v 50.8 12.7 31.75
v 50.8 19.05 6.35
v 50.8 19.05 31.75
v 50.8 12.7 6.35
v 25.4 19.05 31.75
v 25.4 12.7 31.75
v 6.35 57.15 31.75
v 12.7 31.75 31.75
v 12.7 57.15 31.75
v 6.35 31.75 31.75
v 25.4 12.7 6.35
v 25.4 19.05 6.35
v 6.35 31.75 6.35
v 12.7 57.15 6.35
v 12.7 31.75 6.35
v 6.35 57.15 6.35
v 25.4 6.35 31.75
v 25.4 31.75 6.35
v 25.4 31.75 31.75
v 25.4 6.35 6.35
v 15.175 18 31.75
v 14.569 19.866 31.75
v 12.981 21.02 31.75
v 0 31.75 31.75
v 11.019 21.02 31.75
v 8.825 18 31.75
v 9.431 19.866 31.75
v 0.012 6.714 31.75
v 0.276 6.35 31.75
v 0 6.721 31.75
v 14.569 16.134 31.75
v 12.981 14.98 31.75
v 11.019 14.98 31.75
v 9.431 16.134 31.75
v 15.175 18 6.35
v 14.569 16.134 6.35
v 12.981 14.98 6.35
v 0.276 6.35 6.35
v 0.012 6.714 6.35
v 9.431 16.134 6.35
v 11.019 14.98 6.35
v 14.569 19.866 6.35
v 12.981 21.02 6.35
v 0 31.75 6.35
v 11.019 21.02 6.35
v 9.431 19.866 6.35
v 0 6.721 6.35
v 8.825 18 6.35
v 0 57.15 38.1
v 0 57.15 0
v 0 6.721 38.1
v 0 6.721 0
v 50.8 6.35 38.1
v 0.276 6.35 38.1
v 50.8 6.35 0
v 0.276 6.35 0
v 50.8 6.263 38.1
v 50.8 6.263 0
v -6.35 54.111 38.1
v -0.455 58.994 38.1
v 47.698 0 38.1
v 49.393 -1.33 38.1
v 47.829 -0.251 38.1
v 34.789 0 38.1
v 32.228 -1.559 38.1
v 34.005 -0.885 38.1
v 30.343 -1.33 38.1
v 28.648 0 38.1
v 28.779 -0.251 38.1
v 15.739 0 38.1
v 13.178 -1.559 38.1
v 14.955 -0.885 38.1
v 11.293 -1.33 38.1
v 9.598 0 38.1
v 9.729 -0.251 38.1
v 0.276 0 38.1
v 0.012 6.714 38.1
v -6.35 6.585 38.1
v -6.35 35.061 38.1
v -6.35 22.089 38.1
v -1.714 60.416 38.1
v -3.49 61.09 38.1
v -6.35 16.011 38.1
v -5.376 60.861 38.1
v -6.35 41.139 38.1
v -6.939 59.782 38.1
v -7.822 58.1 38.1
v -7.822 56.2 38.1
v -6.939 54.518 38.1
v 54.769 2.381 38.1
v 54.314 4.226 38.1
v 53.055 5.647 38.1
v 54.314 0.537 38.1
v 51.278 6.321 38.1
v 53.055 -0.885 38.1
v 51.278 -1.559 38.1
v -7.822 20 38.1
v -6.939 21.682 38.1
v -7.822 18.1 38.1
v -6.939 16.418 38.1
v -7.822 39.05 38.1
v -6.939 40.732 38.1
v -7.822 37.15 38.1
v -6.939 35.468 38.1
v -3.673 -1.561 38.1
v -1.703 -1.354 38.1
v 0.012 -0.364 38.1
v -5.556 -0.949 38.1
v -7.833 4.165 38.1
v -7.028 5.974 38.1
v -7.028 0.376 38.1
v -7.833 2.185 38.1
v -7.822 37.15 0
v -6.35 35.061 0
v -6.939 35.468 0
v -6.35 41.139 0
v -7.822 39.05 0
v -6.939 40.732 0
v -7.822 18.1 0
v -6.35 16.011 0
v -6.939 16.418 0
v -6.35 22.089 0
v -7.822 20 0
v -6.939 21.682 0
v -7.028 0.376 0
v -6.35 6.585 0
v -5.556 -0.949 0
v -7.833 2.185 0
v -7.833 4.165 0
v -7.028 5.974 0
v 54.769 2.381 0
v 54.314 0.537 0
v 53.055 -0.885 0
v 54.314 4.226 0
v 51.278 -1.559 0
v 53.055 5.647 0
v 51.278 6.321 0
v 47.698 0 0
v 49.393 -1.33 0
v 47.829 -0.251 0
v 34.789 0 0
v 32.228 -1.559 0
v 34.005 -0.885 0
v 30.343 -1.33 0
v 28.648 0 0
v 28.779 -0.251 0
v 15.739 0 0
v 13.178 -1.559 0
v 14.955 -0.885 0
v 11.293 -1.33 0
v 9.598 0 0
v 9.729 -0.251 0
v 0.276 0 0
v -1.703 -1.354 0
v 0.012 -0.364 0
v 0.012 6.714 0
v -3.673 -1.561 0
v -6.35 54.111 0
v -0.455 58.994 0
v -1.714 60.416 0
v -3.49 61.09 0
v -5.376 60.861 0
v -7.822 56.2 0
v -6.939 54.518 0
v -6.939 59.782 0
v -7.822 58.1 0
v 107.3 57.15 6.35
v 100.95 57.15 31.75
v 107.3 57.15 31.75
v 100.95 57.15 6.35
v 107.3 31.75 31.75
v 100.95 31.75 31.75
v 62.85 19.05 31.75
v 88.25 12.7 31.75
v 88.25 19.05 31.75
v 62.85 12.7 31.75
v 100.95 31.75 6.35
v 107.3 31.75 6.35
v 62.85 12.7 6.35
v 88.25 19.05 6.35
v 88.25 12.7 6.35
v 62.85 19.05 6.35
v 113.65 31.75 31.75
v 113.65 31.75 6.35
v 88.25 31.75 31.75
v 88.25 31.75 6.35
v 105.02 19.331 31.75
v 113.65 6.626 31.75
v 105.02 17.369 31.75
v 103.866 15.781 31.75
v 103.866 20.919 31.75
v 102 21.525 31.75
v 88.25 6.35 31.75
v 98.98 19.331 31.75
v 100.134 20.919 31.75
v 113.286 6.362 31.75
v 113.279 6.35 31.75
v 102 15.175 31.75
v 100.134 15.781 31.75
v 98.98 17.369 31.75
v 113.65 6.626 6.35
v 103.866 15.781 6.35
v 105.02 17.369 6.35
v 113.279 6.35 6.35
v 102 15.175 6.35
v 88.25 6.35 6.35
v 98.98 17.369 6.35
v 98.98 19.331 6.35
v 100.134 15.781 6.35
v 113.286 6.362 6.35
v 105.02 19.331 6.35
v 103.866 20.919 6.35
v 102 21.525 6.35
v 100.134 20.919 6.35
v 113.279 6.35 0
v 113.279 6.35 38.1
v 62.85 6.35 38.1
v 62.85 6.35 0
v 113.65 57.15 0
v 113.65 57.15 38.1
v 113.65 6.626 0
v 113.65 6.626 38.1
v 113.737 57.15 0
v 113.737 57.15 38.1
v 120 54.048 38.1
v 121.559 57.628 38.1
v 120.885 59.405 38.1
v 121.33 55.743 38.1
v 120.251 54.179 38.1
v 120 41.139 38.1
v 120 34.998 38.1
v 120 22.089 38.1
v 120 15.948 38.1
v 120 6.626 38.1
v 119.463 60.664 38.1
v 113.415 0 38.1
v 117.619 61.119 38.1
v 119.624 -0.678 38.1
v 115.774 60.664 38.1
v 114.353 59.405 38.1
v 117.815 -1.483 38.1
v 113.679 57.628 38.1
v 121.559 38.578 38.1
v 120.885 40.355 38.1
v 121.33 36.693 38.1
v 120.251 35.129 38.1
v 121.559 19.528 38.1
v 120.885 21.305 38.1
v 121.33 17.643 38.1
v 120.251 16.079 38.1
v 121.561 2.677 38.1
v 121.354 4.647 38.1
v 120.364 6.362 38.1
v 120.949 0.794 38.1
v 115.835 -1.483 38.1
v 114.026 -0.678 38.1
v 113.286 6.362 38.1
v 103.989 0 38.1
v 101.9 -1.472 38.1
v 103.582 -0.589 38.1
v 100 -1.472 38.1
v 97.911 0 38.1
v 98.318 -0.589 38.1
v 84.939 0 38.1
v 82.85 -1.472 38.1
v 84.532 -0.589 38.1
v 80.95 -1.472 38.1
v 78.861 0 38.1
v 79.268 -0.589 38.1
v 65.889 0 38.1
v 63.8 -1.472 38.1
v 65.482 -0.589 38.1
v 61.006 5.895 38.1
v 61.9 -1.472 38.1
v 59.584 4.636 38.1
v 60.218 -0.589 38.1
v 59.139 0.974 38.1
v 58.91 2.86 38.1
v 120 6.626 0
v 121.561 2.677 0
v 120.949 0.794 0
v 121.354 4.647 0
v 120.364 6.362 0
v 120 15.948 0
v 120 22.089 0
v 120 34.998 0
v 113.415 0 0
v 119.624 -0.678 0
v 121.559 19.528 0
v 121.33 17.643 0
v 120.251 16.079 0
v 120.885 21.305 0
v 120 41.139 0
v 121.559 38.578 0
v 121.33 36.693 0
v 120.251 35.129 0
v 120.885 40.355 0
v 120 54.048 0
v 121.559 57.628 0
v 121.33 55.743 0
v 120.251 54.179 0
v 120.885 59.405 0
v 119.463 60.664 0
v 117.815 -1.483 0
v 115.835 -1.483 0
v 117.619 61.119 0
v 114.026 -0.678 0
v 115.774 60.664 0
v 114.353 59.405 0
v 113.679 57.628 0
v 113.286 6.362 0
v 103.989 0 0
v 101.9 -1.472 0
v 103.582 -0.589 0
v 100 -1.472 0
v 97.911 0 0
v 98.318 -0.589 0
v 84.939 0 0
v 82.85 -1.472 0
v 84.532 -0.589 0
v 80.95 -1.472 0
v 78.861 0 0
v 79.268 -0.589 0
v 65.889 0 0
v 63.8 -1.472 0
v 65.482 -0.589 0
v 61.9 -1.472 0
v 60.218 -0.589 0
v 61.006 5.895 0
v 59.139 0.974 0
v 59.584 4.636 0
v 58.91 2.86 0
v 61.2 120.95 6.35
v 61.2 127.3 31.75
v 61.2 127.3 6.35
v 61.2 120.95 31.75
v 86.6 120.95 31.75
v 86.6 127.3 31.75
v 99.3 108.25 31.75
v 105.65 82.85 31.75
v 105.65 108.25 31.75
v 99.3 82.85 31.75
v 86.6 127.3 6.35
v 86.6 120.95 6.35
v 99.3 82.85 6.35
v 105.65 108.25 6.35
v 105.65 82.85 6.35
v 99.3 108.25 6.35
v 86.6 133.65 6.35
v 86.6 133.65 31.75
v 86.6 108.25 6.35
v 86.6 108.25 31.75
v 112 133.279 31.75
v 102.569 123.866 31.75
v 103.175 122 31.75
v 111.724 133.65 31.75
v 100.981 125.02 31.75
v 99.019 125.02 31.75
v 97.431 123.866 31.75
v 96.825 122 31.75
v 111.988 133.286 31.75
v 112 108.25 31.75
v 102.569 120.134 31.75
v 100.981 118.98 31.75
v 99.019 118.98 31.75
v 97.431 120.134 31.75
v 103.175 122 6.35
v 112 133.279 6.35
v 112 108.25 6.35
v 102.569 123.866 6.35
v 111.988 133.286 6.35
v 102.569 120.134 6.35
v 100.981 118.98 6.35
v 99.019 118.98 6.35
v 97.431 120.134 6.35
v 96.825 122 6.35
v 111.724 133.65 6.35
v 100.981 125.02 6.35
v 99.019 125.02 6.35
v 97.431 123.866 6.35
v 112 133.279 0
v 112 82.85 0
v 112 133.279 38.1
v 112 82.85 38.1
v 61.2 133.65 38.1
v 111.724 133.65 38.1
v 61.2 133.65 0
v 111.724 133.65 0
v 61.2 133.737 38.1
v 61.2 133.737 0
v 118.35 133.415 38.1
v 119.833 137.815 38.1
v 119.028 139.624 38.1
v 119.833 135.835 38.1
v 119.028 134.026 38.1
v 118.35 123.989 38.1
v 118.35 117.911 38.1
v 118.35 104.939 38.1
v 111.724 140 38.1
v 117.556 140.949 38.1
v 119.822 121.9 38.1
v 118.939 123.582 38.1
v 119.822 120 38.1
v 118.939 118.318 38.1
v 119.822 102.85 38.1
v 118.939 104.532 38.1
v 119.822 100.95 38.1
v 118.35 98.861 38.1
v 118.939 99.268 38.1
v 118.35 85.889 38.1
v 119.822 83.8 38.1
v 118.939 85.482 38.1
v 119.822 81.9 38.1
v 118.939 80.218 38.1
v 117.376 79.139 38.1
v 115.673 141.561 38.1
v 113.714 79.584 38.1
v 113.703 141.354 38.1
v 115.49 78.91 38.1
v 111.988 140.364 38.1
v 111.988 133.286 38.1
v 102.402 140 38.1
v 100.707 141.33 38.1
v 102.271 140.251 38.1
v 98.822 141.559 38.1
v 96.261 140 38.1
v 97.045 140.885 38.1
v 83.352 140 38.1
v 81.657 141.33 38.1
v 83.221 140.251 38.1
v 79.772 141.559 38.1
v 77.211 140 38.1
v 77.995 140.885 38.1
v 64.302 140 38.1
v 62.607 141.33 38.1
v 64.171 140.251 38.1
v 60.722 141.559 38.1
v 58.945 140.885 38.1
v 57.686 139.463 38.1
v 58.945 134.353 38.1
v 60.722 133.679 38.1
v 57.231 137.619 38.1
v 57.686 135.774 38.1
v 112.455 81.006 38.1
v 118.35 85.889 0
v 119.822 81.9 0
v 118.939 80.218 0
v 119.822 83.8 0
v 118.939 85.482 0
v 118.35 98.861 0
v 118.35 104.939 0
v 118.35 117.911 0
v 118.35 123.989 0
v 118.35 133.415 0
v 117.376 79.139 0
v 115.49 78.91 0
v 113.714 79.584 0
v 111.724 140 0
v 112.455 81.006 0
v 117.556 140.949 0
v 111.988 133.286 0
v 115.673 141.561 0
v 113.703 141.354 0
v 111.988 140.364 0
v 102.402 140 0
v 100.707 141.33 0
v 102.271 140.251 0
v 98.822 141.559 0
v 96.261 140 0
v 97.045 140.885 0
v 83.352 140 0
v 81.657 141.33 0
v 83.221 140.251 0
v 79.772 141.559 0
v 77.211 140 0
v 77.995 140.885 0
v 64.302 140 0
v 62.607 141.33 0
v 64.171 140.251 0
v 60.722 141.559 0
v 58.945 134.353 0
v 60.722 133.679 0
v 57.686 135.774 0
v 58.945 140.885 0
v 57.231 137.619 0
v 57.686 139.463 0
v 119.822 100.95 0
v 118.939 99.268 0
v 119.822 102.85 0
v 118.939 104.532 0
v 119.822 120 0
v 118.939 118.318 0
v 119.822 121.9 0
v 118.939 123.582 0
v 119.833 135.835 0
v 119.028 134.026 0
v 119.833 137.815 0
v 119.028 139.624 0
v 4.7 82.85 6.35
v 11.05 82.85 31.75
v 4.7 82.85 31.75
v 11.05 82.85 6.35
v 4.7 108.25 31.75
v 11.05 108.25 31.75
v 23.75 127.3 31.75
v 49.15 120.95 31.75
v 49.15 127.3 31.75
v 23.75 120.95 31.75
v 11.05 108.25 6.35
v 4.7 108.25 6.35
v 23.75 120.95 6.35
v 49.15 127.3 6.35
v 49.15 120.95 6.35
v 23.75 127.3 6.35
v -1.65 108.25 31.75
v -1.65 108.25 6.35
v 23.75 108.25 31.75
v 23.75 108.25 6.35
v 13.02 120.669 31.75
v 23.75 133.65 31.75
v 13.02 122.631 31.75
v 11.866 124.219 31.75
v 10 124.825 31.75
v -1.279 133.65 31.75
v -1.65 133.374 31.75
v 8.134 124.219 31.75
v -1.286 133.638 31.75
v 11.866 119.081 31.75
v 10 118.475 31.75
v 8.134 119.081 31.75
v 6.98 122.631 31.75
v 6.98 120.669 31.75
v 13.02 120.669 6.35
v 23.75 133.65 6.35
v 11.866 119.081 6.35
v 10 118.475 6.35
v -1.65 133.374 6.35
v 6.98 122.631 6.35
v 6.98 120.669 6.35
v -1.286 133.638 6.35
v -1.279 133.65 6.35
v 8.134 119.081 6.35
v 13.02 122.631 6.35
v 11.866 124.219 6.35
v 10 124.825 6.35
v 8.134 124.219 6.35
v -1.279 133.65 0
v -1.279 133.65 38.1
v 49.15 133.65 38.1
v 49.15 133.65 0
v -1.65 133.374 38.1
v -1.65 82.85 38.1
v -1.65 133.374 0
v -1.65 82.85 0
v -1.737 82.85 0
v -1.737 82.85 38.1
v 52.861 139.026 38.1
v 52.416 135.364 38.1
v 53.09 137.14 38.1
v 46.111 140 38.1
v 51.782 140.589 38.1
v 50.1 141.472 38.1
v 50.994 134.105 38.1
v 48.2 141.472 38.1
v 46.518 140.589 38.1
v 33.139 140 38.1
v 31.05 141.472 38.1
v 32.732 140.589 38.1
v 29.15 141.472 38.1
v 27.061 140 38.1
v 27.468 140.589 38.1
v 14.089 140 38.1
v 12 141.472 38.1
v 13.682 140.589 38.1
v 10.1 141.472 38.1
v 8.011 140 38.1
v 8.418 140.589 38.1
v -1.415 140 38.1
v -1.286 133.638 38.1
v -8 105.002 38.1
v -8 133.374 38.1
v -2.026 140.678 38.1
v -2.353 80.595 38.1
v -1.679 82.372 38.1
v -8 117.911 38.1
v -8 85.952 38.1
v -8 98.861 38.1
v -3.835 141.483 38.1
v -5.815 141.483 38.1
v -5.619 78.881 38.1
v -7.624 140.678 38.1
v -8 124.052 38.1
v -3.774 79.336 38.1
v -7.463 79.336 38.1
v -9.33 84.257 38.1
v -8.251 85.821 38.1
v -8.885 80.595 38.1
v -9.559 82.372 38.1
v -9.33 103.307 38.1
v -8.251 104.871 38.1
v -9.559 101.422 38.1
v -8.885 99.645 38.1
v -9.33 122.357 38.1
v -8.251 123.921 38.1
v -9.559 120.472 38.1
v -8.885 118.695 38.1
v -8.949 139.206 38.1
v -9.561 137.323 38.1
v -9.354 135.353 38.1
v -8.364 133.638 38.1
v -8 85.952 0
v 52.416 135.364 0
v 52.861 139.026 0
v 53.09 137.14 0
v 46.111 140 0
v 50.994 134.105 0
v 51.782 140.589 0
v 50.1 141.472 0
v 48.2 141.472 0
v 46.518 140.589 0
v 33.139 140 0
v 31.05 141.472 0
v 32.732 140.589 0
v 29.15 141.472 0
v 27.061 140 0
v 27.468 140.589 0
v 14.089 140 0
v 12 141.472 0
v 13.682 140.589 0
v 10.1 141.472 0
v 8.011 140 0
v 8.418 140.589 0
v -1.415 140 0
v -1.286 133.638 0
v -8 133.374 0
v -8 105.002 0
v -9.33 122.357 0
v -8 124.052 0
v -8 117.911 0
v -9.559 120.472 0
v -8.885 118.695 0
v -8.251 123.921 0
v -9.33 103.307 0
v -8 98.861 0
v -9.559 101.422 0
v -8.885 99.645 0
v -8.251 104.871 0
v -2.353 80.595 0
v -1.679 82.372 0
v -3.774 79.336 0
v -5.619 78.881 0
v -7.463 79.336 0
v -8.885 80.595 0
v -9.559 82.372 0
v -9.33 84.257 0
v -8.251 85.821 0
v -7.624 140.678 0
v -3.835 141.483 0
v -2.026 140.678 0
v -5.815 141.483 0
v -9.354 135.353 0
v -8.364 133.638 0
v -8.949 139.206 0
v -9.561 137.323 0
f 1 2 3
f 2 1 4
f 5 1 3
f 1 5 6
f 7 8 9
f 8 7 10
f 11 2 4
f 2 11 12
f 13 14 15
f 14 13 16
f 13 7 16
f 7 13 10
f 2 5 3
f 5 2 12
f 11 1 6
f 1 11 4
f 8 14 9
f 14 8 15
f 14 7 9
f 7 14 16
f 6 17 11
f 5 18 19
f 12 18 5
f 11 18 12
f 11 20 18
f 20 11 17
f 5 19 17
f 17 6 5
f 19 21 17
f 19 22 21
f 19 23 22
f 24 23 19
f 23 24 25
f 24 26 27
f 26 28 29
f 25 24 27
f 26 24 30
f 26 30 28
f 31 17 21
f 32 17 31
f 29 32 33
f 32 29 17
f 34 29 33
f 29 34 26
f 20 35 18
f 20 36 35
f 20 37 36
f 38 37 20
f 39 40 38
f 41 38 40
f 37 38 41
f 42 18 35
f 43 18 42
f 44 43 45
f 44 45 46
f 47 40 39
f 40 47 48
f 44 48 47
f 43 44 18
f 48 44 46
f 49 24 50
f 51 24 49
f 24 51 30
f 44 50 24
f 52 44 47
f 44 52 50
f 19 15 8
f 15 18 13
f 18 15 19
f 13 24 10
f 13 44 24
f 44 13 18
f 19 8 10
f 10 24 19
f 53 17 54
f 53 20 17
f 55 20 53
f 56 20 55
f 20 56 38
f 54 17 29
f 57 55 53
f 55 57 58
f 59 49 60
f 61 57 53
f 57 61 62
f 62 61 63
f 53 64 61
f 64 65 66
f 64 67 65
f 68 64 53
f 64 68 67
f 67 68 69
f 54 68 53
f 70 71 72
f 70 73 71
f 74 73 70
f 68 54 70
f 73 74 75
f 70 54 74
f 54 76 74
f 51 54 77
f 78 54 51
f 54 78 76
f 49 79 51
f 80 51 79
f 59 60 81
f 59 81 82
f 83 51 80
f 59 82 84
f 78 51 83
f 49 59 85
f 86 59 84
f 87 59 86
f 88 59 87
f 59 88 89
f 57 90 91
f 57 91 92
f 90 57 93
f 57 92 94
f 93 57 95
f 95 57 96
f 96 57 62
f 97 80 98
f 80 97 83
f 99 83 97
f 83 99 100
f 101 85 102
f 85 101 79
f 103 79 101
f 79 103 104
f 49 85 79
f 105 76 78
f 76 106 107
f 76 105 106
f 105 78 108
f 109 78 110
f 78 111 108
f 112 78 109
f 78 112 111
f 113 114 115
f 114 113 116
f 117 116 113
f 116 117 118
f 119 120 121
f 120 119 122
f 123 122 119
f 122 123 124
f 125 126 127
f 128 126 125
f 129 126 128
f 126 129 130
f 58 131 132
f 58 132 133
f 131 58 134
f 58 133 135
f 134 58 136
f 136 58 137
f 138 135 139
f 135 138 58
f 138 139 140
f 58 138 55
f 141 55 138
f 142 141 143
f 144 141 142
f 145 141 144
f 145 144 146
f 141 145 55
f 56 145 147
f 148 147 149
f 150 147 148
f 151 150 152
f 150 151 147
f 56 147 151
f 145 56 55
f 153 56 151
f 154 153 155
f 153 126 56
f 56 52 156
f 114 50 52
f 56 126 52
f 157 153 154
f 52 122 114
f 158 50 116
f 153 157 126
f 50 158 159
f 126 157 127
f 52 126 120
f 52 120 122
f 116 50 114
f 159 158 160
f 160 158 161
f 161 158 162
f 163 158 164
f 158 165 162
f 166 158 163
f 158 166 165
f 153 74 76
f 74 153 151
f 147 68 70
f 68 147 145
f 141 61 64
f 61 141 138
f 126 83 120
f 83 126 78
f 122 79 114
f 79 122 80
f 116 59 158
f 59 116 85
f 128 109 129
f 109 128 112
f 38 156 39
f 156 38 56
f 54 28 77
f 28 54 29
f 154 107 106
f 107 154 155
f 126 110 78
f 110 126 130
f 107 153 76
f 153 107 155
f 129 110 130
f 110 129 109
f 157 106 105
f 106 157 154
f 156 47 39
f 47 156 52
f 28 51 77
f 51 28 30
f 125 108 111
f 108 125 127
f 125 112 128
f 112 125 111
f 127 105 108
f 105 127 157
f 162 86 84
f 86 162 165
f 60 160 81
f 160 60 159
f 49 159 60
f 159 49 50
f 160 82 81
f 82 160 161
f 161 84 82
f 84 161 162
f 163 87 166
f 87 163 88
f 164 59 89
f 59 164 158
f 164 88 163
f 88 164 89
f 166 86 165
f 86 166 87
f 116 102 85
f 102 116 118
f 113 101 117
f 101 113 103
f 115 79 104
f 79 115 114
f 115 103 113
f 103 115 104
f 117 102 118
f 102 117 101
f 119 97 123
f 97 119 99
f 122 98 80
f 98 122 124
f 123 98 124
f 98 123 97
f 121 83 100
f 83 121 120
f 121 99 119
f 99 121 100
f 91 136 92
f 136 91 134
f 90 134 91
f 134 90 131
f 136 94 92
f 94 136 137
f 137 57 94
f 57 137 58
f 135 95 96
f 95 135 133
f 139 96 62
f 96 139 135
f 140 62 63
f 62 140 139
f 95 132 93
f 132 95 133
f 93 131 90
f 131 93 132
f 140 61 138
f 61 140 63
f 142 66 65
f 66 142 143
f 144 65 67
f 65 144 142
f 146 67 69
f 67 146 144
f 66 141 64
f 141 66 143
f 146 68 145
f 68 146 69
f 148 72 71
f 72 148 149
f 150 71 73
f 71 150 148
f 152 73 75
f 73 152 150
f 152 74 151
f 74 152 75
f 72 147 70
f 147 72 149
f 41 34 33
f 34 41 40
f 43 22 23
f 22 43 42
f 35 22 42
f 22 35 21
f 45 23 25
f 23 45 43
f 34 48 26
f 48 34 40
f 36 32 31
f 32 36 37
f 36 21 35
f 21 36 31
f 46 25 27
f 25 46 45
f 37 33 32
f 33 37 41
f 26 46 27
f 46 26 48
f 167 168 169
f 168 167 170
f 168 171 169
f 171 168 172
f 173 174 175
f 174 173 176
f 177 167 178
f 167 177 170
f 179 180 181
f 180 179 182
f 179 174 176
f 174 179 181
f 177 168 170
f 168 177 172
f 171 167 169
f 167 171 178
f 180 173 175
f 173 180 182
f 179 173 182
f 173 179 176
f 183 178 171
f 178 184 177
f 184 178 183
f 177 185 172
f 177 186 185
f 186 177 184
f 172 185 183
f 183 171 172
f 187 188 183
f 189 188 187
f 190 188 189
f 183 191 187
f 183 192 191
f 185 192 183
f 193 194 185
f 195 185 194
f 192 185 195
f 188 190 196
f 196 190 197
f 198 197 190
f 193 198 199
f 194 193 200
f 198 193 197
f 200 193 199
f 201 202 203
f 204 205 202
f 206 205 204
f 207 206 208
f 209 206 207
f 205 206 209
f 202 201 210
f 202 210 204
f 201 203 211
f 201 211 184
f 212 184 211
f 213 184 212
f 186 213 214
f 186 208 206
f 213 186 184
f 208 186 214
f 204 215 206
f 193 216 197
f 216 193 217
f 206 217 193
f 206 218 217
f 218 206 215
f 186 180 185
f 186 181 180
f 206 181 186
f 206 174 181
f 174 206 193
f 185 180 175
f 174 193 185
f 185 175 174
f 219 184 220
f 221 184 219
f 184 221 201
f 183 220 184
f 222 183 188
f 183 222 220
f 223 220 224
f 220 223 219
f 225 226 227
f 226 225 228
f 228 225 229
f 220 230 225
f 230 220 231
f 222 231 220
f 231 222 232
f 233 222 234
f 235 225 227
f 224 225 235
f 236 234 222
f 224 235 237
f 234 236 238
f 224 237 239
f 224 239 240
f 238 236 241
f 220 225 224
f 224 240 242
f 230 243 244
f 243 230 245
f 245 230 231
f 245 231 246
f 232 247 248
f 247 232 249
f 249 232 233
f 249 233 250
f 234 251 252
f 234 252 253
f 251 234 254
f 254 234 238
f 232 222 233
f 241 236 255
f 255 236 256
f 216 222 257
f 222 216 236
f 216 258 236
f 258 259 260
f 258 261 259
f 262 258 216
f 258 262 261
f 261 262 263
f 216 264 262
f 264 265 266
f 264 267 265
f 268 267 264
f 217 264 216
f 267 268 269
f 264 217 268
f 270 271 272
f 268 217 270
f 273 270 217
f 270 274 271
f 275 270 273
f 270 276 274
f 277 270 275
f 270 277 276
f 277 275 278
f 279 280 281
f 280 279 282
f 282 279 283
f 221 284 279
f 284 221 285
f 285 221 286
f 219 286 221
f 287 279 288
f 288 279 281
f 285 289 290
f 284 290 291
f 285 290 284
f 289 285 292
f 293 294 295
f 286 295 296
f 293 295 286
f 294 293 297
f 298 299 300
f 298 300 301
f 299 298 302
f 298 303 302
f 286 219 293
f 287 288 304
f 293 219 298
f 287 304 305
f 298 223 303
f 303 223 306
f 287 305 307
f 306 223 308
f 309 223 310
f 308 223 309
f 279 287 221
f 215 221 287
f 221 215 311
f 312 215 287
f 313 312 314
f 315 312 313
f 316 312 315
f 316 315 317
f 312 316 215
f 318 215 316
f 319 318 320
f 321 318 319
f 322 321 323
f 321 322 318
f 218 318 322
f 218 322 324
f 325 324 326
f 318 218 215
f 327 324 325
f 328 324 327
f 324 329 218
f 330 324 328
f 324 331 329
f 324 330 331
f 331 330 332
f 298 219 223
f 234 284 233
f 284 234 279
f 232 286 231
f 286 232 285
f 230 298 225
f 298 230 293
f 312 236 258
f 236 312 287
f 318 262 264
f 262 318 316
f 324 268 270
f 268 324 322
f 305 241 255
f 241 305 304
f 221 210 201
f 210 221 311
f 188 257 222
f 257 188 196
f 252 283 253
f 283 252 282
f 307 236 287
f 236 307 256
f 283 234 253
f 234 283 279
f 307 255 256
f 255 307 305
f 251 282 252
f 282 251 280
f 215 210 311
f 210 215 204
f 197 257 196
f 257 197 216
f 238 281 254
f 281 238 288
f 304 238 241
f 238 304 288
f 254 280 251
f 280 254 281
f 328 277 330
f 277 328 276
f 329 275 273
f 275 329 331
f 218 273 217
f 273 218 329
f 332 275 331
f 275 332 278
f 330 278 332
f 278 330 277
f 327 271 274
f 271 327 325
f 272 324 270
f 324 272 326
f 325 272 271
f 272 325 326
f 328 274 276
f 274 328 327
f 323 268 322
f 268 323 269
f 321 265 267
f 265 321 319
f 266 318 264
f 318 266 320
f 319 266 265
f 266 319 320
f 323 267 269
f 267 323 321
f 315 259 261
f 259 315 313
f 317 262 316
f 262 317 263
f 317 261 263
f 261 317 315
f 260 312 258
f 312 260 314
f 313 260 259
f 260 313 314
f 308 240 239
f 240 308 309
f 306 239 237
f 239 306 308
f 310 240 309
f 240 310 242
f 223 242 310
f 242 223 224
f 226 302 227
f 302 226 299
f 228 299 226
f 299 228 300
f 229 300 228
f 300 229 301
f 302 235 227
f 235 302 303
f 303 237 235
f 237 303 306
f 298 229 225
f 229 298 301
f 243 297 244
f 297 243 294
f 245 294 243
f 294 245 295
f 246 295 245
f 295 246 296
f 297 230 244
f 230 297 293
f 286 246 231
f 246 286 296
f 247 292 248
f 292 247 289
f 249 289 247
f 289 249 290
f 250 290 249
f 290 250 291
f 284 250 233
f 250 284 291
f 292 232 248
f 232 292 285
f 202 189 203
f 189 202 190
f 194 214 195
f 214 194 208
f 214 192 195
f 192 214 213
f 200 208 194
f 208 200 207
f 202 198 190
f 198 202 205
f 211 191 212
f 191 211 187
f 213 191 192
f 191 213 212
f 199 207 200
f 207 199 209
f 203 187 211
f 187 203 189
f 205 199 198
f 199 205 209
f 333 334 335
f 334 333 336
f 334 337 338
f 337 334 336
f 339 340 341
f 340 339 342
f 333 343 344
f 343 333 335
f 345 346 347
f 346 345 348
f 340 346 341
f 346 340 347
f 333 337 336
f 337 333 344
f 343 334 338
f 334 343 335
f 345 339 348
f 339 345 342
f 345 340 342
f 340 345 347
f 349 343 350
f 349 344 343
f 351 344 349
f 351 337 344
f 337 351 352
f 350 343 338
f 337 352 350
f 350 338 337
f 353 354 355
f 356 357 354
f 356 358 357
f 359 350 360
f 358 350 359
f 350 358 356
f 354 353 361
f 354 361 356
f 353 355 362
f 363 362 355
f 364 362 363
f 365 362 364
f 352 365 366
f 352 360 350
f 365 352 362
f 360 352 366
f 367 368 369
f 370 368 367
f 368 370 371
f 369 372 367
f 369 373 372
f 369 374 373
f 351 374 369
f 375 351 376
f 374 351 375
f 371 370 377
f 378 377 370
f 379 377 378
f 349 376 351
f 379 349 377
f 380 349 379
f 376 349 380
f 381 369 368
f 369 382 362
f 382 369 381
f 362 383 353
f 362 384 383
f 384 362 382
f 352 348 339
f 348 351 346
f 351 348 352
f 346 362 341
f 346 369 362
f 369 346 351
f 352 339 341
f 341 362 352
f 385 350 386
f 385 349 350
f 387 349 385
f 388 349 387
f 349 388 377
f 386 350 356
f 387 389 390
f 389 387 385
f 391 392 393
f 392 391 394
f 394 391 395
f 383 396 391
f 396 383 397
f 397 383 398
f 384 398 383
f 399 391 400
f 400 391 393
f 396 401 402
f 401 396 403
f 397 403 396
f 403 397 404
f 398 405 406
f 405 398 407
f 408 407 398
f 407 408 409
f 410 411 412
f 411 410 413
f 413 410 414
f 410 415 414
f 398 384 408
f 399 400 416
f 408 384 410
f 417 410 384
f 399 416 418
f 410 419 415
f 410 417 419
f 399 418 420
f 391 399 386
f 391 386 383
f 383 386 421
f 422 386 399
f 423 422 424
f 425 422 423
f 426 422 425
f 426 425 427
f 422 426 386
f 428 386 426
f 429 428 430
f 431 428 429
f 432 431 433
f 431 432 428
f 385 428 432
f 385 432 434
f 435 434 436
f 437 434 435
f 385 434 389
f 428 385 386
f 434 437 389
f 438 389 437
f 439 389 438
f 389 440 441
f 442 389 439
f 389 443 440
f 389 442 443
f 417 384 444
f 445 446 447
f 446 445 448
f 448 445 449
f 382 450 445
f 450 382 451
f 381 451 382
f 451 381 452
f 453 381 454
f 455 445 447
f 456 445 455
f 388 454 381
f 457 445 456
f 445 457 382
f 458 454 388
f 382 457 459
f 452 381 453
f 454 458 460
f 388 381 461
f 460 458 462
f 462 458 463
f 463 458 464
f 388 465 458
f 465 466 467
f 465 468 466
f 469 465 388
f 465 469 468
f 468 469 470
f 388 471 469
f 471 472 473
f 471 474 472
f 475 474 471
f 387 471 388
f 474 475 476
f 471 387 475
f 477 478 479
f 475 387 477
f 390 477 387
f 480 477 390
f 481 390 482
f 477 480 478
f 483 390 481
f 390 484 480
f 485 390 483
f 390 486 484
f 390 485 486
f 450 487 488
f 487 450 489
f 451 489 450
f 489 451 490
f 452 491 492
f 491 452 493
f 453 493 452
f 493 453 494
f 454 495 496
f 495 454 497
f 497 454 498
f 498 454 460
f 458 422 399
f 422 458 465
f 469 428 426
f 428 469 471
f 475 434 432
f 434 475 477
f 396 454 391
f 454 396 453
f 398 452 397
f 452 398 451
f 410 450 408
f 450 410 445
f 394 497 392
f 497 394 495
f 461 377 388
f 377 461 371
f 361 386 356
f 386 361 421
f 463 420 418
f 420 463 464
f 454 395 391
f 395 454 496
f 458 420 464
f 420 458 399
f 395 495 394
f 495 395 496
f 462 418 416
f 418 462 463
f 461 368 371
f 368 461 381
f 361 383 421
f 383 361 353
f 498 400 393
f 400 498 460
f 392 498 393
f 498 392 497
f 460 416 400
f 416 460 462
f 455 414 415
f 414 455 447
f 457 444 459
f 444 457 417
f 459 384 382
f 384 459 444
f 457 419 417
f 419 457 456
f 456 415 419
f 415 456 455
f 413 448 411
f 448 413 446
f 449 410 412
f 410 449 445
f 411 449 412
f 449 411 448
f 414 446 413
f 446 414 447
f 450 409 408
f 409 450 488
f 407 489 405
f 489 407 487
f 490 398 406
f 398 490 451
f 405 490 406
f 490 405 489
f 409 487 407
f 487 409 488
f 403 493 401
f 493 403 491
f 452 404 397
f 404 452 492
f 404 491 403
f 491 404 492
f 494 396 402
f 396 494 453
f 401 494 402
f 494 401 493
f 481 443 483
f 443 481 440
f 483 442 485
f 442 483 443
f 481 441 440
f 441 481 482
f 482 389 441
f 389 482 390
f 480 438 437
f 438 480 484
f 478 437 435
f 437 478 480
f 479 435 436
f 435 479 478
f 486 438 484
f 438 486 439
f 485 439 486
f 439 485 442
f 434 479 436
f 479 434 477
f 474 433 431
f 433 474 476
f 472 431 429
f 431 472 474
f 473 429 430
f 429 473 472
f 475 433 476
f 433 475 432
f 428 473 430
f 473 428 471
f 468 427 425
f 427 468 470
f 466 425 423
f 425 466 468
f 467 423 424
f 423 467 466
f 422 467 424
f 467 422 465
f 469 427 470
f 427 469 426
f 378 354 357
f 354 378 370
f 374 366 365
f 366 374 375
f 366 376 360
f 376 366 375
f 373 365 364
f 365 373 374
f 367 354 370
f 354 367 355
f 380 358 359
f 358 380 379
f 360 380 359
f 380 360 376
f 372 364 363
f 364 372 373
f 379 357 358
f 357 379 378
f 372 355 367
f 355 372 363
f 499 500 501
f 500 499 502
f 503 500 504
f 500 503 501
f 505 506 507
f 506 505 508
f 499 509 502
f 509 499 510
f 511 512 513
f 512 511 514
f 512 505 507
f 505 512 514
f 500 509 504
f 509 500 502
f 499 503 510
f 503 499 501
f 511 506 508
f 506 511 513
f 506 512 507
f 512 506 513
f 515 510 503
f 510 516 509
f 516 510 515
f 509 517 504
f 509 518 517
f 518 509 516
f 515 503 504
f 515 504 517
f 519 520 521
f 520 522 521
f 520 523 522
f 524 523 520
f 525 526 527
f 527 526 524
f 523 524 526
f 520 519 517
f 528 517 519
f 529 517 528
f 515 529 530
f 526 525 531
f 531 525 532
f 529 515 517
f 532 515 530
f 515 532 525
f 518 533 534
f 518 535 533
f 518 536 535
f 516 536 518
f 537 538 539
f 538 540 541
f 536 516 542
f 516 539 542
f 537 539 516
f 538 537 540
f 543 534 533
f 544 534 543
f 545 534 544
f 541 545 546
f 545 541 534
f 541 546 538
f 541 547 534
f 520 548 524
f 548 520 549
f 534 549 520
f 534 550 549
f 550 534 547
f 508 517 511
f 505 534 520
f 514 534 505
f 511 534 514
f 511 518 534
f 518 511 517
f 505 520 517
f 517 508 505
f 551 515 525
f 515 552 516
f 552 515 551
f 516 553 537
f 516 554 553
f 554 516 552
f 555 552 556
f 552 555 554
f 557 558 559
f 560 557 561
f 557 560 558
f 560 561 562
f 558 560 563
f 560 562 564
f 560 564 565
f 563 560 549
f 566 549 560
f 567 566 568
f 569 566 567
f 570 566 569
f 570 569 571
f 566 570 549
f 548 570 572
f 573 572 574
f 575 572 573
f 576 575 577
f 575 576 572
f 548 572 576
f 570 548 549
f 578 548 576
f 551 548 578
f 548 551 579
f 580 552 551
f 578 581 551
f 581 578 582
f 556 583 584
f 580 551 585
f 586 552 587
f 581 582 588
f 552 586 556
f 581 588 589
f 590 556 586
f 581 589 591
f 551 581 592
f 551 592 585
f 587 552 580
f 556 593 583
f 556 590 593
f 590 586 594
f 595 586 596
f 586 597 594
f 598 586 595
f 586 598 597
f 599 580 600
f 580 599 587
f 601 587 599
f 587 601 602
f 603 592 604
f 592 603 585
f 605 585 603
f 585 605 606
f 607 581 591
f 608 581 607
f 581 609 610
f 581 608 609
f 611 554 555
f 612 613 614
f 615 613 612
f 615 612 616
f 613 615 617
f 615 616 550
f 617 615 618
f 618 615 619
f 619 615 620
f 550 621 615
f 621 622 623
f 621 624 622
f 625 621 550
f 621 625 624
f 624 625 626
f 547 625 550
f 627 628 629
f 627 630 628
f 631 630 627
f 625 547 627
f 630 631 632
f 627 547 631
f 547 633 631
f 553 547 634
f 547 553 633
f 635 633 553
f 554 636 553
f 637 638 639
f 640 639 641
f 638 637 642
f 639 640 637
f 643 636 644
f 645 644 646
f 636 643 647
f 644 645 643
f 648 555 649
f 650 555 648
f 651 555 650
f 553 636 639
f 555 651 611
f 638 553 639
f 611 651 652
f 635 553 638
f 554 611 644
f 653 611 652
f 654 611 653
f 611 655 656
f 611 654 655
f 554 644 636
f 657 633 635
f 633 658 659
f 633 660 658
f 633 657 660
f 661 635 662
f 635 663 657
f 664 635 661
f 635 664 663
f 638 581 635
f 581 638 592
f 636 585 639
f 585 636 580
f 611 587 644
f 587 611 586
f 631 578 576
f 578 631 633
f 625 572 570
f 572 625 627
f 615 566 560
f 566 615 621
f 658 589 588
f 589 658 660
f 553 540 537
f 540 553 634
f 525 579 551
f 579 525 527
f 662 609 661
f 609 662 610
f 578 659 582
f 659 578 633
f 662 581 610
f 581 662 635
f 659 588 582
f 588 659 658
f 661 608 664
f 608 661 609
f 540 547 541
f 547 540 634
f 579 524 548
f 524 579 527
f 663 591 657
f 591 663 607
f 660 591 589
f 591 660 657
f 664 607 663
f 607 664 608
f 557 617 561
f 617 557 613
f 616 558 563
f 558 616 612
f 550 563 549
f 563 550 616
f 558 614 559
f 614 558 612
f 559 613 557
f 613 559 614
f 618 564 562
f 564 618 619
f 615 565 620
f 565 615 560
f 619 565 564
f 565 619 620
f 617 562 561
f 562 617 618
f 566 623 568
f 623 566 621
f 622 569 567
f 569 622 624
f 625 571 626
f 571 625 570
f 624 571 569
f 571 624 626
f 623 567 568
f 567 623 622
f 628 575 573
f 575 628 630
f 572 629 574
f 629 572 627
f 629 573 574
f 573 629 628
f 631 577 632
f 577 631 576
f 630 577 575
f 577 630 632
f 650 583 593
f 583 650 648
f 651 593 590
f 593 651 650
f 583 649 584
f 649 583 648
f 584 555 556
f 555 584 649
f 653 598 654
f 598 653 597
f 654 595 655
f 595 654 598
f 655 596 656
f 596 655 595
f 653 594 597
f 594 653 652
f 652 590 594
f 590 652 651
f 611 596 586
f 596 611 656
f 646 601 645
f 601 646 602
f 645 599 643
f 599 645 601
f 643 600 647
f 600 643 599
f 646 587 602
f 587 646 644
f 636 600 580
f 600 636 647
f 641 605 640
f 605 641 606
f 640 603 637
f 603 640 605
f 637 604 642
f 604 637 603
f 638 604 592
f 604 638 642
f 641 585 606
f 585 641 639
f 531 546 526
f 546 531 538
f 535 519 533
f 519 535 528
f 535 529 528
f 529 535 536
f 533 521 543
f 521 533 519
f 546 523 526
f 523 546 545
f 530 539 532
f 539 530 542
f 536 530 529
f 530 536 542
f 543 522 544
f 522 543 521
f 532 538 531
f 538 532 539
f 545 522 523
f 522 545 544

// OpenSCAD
// file: joints.scad
/**
 * joints.scad is part of Paper Laptop project.
 * This file contains various models for joining two or
 * more pieces of flat materials together.
 *
 * @author R. S. Doiel, <rsdoiel@gmail.com>
 * copyright (c) 2016 all rights reserved
 * Released under a BSD 2-clause license
 */

// Formboard firm enough to make a case with is about
// 1/4th inch (6.35mm) thick. Usually sold in single sheets
// of about 20"x30".

//
// Basic models are for parts without any holes for fasteners.
//

/*
 * CornerBasic() - corner joint without fastener hole
 */
module CornerBasic() {
    u = 3.175; // Unit is 3.175mm or 1/8th inch:w
    t = u*2; // Thickness of the 1/4th" Foamboard

    // Inner block, width, depth, height
    translate([0, t, t]) {
            color([1,0,0]) cube([25.4, 25.4, 25.4]); 
    }
    // Outer shell
    color([0,1,0]) cube([50.8,t,25.4+(2*t)]);
    translate([-t,t,0]) {
        color([0,1,0]) cube([t,50.8,25.4+(2*t)]);
    }
    // Outer corners
    translate([u*-1,u,0]) {
        color([0,1,0]) cylinder(h=25.4+(2*t),r=1.5*u,center=false);
    }

    // Outer bumps
    translate([u*-1.25,u*18,0]) {
        color([0,1,0]) cylinder(h=25.4+(2*t),r=1.25*u,center=false);
    }
    translate([u*-1.25,u*12,0]) {
        color([0,1,0]) cylinder(h=25.4+(2*t),r=1.25*u,center=false);
    }
    translate([u*-1.25,u*6,0]) {
        color([0,1,0]) cylinder(h=25.4+(2*t),r=1.25*u,center=false);
    }

    translate([u*16,u*0.75,0]) {
        color([0,1,0]) cylinder(h=25.4+(2*t),r=1.25*u,center=false);
    }
    translate([u*10,u*0.75,0]) {
        color([0,1,0]) cylinder(h=25.4+(2*t),r=1.25*u,center=false);
    }
    translate([u*4,u*0.75,0]) {
        color([0,1,0]) cylinder(h=25.4+(2*t),r=1.25*u,center=false);
    }
    
    // Inner shell
    translate([t,2*t,t]) {
        color([0,1,0]) cube([50.8-t,t,25.4]);
        color([0,1,0]) cube([t,50.8-t,25.4]);
    }
}

//
// Corner() basic corner joint plus hole for fastener
//
module Corner() {
    difference() {
        u = 3.175;
        CornerBasic();
        // Add a hole for screw
        translate([12,18,0]) {
            color([0,0,1]) cylinder(h=25.4+(4*u),r=u,center=false);
        }
    }
}

Corner();
// main file
//
// paperlaptop.scad - parts design to facilitate building
// laptop prototype cases out of cardboard or formboard.
//
// @author R. S. Doiel, <rsdoiel@gmail.com>
// copyright (c) 2016 all rights reserved
// Licensed under the 2-clause BSD License
//
include <joints.scad>


// Four corner joints
module FourCornersGrouped() {
    Corner();
    translate([120,6.35,0]) {
        rotate(90) {
            Corner();
        }
    }
    translate([112, 140, 0]) {
        rotate(180) {
            Corner();
            translate([120,6.35,0]) {
                rotate(90) {
                    Corner();
                }
            }
        }
    }
}
FourCornersGrouped();
